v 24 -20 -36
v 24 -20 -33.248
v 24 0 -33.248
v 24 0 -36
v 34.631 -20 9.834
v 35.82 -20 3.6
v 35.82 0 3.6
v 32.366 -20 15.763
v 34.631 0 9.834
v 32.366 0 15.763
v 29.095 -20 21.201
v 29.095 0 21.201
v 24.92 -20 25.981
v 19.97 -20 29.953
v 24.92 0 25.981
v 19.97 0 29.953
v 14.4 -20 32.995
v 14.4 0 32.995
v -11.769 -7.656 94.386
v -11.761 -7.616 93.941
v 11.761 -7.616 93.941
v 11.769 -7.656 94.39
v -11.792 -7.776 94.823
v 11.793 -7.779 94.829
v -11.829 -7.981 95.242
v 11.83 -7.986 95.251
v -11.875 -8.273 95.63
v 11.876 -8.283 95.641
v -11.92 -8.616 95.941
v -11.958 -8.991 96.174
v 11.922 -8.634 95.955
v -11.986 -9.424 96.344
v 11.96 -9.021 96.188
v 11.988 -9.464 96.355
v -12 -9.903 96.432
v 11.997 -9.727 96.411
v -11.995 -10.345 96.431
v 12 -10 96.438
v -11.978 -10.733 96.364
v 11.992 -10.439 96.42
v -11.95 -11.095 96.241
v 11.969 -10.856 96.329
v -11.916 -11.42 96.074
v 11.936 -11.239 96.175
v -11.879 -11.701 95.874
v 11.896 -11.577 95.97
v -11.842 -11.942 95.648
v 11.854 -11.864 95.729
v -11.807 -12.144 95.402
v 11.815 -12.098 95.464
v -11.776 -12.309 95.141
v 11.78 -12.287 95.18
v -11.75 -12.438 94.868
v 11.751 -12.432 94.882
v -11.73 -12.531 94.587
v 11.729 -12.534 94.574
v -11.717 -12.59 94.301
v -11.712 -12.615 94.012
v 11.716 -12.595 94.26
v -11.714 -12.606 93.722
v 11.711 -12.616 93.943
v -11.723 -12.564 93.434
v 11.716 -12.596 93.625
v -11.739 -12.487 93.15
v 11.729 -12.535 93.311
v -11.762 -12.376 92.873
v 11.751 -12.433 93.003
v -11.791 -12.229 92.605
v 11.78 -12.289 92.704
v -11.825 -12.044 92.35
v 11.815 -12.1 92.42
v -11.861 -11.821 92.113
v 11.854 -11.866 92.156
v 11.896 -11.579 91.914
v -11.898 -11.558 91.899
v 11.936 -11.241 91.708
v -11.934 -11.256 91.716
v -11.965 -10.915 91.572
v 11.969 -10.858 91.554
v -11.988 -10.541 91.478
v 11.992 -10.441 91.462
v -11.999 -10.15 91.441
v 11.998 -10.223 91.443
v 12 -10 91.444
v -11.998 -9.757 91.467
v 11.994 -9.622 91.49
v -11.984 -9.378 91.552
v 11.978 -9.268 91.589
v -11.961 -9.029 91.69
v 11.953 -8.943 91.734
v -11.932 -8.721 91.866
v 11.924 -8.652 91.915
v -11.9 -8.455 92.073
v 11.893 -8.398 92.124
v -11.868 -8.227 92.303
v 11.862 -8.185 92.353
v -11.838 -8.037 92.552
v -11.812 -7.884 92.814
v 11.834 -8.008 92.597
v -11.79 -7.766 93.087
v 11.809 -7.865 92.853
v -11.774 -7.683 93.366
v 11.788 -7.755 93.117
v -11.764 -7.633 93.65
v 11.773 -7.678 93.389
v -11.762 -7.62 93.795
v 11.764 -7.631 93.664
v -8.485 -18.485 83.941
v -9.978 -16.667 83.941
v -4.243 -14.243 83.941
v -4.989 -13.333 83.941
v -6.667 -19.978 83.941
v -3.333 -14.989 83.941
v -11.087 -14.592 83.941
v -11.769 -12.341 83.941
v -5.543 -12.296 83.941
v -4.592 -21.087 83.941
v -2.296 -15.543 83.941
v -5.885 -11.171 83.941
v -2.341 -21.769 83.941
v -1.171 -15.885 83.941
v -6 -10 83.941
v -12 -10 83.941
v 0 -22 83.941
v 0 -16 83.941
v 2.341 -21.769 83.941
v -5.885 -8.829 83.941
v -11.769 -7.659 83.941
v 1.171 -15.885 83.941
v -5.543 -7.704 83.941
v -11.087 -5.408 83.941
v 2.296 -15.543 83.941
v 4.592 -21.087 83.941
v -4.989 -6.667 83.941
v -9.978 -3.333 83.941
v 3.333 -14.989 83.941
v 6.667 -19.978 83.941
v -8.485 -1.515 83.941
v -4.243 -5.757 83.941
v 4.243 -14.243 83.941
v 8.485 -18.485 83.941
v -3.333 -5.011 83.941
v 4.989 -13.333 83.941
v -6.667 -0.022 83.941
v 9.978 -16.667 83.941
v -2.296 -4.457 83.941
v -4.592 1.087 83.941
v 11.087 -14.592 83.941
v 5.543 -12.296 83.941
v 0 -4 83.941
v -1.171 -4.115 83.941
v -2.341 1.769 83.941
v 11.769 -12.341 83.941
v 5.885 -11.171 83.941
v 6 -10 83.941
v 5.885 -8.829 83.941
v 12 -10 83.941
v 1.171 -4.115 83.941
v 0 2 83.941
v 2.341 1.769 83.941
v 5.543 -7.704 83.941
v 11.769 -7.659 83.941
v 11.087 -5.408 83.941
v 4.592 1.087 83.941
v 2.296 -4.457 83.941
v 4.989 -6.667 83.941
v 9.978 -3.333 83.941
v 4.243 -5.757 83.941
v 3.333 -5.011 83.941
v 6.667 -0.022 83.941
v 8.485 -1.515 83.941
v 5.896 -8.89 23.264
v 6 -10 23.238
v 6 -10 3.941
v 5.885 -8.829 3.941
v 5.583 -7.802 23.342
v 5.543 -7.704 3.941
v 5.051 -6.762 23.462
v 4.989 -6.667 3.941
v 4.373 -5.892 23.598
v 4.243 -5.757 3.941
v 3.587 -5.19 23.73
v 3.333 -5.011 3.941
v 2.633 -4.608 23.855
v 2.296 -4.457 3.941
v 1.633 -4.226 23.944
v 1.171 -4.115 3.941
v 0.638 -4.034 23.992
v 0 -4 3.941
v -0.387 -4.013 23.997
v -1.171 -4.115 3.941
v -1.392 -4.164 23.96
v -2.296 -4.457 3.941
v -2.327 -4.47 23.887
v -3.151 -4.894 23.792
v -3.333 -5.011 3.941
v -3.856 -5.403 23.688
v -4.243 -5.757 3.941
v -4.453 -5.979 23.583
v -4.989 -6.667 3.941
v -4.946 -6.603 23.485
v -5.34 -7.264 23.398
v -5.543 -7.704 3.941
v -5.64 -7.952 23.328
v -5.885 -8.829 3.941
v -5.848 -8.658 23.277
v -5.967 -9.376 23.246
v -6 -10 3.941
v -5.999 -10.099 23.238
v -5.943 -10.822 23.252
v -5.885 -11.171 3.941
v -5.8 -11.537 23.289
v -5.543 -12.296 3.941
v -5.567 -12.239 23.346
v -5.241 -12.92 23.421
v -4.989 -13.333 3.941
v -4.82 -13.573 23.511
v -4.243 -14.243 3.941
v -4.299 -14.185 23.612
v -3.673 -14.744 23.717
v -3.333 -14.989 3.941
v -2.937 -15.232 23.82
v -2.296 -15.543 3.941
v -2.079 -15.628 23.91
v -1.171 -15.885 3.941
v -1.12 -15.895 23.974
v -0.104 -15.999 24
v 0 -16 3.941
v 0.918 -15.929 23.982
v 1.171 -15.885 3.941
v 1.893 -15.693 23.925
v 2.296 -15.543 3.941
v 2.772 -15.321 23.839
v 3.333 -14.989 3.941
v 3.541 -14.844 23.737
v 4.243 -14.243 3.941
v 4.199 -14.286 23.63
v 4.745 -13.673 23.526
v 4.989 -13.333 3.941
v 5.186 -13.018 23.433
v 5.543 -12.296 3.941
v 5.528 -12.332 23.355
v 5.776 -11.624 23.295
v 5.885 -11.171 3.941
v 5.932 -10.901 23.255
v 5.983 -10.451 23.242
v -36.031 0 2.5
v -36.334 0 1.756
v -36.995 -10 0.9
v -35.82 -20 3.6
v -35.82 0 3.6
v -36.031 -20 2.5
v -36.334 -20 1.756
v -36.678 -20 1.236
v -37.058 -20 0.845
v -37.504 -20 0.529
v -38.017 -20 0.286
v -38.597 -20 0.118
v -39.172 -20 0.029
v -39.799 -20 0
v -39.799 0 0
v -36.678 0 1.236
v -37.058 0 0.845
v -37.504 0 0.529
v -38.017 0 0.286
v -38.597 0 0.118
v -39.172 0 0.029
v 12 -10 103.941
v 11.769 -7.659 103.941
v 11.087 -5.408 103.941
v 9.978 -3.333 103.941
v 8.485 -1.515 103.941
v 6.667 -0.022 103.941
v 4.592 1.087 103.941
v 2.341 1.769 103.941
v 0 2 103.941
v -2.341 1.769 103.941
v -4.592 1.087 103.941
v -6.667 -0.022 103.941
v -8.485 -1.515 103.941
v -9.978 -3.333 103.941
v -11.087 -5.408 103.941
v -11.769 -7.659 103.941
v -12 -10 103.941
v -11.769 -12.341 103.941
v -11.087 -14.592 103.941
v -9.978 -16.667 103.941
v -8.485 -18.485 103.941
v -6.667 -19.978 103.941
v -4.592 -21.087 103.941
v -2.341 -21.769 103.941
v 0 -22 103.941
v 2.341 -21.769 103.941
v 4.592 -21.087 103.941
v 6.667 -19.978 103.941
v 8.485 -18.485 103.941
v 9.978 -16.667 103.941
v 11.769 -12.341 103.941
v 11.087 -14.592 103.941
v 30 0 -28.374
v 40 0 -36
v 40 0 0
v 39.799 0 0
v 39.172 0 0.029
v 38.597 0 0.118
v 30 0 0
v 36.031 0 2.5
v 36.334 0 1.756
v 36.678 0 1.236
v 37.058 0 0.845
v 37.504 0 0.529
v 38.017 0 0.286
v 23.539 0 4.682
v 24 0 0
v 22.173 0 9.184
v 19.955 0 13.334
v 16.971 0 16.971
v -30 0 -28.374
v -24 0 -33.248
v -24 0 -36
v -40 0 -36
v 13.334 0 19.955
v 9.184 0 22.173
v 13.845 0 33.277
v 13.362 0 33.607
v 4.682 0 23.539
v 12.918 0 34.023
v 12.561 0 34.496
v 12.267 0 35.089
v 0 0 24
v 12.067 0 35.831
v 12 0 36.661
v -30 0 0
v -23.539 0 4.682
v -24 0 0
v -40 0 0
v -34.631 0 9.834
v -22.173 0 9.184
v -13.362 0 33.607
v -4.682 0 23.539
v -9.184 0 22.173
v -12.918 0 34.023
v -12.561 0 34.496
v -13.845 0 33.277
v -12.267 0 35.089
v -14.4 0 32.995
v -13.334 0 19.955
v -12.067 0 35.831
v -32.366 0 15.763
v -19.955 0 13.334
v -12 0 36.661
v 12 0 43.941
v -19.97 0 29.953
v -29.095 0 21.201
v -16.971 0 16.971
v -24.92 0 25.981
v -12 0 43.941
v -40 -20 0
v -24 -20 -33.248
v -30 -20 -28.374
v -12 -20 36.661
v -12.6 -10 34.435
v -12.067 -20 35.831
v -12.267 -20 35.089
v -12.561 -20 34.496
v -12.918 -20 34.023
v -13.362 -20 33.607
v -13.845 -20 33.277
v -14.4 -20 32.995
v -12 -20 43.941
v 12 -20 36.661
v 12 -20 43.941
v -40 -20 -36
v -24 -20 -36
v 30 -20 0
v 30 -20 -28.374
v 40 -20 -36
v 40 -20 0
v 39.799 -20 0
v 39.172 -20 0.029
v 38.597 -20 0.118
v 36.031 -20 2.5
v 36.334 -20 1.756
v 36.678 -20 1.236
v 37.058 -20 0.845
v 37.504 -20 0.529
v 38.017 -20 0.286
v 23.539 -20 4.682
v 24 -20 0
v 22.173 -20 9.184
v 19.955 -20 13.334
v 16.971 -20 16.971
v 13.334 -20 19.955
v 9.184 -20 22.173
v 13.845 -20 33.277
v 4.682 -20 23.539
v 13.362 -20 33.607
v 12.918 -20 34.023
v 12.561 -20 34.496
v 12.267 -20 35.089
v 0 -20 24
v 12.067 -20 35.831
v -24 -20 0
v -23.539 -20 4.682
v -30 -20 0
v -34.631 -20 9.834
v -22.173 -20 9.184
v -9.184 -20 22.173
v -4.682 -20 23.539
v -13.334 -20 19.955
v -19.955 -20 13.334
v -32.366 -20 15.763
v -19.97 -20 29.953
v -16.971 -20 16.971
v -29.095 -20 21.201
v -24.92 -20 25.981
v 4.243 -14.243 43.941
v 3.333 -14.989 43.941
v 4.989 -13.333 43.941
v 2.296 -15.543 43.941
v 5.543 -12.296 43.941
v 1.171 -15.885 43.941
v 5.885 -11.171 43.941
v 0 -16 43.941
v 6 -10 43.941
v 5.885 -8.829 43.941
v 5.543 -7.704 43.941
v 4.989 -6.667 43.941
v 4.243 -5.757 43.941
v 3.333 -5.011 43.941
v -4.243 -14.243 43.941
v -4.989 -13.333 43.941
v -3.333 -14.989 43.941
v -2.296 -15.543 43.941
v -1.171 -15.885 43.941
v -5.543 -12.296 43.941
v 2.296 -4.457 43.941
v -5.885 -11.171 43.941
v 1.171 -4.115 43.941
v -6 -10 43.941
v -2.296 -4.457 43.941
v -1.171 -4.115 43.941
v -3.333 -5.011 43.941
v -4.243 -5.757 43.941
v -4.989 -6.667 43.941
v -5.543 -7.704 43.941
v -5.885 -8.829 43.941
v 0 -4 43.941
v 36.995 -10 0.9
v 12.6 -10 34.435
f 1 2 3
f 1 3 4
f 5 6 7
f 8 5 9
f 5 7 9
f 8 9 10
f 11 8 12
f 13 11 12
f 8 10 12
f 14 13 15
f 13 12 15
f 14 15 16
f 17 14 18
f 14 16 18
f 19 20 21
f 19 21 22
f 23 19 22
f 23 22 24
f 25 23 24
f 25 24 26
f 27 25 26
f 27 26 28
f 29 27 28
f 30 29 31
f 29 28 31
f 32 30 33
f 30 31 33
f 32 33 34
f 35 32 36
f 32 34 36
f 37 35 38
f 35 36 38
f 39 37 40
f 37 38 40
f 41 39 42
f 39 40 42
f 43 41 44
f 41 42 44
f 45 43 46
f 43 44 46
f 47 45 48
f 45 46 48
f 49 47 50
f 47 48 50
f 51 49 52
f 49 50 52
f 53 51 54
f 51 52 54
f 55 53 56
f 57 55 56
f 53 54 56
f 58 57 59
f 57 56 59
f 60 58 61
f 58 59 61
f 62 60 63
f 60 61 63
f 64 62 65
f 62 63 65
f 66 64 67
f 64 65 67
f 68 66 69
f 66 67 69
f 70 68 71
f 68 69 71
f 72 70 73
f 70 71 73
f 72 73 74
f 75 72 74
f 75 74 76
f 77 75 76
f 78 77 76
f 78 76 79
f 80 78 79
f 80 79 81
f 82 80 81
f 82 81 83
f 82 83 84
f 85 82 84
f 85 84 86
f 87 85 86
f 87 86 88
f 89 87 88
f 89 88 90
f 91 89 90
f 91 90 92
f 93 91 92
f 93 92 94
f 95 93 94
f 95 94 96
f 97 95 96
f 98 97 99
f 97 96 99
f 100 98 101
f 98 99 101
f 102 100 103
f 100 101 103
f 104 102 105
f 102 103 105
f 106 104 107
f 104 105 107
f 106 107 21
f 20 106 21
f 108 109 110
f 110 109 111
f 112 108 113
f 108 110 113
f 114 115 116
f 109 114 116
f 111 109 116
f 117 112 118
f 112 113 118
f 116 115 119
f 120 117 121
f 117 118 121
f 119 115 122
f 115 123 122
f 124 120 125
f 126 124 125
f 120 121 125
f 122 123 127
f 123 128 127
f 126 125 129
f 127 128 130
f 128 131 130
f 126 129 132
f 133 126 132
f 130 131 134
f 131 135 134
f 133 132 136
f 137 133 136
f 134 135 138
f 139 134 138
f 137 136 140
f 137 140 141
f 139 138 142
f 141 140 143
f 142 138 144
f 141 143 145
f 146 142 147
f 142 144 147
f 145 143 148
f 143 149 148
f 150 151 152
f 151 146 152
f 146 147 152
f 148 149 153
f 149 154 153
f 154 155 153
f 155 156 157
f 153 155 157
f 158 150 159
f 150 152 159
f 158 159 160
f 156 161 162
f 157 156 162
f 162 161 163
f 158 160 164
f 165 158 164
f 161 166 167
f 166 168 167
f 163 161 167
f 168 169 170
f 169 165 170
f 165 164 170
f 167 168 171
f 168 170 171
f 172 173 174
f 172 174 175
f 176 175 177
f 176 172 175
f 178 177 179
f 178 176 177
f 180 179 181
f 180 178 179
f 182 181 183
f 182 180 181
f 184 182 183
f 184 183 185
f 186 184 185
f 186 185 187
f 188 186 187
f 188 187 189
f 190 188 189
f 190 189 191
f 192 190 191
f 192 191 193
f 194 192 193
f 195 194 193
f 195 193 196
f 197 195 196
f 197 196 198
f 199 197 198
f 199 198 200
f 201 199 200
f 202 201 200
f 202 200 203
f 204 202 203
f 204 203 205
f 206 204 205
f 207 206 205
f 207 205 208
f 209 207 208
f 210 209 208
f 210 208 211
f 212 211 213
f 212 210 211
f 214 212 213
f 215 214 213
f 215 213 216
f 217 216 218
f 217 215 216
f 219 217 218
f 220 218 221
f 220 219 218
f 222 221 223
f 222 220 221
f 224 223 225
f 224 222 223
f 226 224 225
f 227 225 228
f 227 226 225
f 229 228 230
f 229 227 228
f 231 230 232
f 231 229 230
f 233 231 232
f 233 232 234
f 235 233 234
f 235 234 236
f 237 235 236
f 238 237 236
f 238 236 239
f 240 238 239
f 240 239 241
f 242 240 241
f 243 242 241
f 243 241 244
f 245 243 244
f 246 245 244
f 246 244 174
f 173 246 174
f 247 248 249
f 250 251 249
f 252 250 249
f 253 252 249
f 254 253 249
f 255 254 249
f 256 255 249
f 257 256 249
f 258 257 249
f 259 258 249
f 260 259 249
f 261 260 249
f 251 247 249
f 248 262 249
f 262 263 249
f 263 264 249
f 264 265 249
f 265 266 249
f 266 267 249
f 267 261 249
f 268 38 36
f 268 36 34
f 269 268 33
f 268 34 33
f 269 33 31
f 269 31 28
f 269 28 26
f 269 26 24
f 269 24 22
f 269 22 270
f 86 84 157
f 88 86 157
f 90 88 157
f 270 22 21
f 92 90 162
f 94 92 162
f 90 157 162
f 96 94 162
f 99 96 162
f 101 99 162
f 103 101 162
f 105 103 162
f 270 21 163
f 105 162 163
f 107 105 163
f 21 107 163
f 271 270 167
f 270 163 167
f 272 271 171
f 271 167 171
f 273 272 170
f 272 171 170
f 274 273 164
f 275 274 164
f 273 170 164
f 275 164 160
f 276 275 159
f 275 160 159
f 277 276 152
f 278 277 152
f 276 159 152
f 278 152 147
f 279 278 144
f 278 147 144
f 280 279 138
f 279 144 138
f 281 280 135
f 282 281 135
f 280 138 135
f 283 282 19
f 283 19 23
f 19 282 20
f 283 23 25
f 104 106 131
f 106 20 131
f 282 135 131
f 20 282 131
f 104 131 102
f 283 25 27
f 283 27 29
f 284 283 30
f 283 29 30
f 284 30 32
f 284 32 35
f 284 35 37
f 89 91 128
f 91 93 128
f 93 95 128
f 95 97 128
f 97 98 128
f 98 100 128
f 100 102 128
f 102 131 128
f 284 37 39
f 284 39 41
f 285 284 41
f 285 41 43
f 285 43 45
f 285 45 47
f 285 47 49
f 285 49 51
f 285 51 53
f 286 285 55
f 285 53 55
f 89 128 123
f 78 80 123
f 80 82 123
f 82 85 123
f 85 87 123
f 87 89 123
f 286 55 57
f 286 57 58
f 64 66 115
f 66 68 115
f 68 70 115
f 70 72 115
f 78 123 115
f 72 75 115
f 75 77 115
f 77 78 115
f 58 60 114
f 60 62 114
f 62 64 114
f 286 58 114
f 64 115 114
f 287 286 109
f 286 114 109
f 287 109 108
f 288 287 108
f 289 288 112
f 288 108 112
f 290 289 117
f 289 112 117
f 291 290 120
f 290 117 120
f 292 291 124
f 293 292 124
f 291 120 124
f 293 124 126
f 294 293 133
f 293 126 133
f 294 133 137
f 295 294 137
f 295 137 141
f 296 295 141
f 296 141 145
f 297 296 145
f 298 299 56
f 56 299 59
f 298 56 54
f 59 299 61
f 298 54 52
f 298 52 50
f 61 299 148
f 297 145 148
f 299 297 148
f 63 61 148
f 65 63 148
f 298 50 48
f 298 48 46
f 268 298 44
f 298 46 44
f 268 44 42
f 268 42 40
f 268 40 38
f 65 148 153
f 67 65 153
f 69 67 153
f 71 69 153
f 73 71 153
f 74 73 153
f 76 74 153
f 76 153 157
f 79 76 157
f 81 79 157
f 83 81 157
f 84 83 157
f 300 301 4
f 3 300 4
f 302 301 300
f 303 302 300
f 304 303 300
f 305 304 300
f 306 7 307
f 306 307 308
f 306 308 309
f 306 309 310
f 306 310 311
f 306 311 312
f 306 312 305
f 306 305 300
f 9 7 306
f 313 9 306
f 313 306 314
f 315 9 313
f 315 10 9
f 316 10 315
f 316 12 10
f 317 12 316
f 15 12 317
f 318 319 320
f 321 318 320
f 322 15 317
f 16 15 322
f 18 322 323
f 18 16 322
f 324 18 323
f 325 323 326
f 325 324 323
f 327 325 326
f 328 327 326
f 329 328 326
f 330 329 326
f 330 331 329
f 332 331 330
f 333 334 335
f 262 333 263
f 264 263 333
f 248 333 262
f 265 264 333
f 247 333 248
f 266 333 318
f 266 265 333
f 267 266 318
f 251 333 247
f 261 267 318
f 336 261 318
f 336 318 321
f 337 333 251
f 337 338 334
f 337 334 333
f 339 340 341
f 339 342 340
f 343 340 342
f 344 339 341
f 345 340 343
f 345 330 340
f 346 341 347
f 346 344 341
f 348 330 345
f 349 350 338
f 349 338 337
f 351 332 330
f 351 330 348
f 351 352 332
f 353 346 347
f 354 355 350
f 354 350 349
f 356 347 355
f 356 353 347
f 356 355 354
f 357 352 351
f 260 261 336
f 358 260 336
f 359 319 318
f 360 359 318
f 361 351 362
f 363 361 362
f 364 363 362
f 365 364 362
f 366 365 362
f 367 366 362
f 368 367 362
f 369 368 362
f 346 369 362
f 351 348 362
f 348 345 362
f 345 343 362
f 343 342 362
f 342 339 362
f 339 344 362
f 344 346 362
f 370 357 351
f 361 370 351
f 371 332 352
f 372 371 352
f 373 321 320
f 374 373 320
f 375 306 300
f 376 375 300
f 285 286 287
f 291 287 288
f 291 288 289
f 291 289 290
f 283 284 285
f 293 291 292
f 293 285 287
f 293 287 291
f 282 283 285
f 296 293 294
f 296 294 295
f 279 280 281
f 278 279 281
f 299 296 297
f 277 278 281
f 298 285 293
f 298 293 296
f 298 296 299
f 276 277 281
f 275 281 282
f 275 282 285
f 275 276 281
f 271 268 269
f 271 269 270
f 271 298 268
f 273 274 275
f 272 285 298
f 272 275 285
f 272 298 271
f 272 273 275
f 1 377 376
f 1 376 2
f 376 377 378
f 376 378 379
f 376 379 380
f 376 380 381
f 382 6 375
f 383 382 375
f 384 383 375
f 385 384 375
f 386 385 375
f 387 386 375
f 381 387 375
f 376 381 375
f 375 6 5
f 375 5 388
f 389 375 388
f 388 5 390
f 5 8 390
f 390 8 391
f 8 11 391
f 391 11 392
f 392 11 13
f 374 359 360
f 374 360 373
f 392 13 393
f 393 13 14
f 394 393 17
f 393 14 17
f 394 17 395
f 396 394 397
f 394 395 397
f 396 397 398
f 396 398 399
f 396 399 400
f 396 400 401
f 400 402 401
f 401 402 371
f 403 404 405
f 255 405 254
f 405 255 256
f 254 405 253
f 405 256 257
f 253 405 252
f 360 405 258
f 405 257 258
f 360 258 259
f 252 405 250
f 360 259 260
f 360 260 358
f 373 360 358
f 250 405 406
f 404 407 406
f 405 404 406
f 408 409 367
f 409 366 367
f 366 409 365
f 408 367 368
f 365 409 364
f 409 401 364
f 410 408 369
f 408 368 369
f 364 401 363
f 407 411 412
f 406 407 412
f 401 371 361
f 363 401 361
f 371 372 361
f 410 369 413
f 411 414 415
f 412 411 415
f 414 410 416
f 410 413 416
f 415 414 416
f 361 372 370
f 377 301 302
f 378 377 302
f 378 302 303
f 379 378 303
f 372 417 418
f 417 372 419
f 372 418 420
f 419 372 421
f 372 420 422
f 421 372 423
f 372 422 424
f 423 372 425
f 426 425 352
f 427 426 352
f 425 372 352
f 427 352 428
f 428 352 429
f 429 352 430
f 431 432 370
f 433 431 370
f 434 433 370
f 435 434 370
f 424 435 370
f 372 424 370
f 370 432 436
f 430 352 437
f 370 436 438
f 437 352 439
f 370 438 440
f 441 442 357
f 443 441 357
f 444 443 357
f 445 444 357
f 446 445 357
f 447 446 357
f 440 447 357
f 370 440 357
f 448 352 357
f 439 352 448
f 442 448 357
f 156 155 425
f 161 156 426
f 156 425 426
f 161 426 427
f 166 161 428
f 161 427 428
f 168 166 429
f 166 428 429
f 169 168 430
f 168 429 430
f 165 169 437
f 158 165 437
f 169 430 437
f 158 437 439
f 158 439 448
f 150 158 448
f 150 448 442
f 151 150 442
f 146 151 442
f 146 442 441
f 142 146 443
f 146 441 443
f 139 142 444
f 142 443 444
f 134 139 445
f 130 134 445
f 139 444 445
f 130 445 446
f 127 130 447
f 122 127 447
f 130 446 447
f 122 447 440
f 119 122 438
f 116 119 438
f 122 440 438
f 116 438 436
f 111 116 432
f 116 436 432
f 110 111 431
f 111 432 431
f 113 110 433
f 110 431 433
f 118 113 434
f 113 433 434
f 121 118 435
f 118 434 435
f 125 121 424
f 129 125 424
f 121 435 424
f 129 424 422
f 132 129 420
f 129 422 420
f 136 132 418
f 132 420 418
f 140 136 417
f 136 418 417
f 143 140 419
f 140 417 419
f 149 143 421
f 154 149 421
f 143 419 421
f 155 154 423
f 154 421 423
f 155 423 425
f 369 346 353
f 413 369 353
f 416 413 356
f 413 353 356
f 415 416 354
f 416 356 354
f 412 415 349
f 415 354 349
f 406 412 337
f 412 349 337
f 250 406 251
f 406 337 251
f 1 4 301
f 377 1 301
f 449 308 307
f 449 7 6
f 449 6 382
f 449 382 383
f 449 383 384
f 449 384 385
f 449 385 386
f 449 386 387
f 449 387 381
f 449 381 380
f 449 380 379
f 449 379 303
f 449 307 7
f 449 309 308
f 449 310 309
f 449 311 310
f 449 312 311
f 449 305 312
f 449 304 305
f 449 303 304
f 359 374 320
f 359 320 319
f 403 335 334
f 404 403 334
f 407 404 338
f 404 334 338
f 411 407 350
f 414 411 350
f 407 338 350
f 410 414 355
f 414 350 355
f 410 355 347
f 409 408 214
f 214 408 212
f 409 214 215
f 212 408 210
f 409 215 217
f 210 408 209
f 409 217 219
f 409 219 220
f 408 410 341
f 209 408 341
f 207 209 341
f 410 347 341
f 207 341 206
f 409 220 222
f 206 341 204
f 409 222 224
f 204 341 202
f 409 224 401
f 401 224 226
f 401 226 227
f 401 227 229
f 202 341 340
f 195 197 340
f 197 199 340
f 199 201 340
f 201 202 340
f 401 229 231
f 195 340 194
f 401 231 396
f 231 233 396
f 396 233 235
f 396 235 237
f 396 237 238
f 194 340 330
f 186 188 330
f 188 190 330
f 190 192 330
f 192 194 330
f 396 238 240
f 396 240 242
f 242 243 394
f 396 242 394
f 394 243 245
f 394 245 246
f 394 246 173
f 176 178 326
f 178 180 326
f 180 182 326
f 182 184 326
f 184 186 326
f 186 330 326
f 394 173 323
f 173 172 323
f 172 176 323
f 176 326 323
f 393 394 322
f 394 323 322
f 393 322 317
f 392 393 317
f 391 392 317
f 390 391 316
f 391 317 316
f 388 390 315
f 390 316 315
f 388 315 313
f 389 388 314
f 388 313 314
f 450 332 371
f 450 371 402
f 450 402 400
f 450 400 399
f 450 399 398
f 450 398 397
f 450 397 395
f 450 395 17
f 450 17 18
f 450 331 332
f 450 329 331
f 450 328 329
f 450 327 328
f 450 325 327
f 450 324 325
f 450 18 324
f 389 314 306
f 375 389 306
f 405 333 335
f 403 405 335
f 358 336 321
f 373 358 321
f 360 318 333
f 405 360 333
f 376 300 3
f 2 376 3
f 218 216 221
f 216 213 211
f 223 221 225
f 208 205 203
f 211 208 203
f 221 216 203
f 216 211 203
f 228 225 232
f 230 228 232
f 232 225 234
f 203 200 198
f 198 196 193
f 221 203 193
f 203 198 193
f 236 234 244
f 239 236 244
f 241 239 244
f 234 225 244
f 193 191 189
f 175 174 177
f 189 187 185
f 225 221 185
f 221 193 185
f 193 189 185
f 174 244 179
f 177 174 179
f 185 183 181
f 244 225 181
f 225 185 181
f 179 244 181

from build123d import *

# Parameters (mm, degrees)
F1_DEPTH      = 20
F2_R          = 6
F3_DEPTH      = 40
F3_DEPTH_BACK = 40
F4_R          = 12
F5_DEPTH      = 20
F7_R          = 2.5
F8_DEPTH      = 25
F9_T1_DEPTH   = 20


# Not quite as in the source:
# - a fillet or chamfer that OpenCascade refuses, or shapes differently, is made with other operations: its cross-section is extruded or revolved along the edge and cut away or added
# - a feature names something its author has since deleted; it is built from what else it names


with BuildPart() as f1:
    # F0 (on Front) → F1 (new body)
    with BuildSketch(Plane.XZ):
        with BuildLine():
            ThreePointArc((-12, 33.941125497), (-29.3938769134, 20.7846096908), (-36, 0))
            Line((-36, 0), (-30, 0))
            Line((-30, 0), (-24, 0))
            ThreePointArc((-24, 0), (0, 24), (24, 0))
            Line((24, 0), (30, 0))
            Line((30, 0), (36, 0))
            ThreePointArc((36, 0), (29.3938769134, 20.7846096908), (12, 33.941125497))
            Line((12, 33.941125497), (12, 43.941125497))
            Line((12, 43.941125497), (-12, 43.941125497))
            Line((-12, 43.941125497), (-12, 33.941125497))
        make_face()
        Polygon((-30, 0), (-36, 0), (-40, 0), (-40, -28.374), (-40, -36), (-24, -36), (-24, -33.2482792437), (-30, -28.374), align=None)
        Polygon((36, 0), (30, 0), (30, -28.374), (24, -33.2482792437), (24, -36), (40, -36), (40, -28.374), (40, 0), align=None)
    extrude(amount=F1_DEPTH)

    # F2 (on face) → F3 (join, two sides)
    with BuildSketch(Plane.XY.offset(43.941125497)) as f3_sk:
        with Locations((0, -10)):
            Circle(F2_R)
    extrude(amount=F3_DEPTH)
    extrude(f3_sk.sketch, amount=-F3_DEPTH_BACK)

    # F4 (on face) → F5 (join)
    with BuildSketch(Plane.XY.offset(83.941125497)):
        with Locations((0, -10)):
            Circle(F4_R)
    extrude(amount=F5_DEPTH)

    # F7 (on offset) → F8 (cut)
    with BuildSketch(Plane.YZ.offset(12)):
        with Locations((-10.1158004254, 93.941125497)):
            Circle(F7_R)
    extrude(amount=-F8_DEPTH, mode=Mode.SUBTRACT)

    # F9: fillet of radius 4 on 4 edges, made by hand

    # F9_s2 → F9_t1 (join)
    with BuildSketch(Plane.XZ):
        with BuildLine():
            add(Edge.make_bspline(
                [(35.8195477358, 3.6), (36.1813613493, 0), (39.7994974843, 0)],
                knots=[0, 0, 0, 1, 1, 1], degree=2, weights=[1, 1, 1]))
            Line((39.7994974843, 0), (36, 0))
            ThreePointArc((36, 0), (35.954858632, 1.8022599022), (35.8195477358, 3.6))
        make_face()
        with BuildLine():
            add(Edge.make_bspline(
                [(-35.8195477358, 3.6), (-36.1813613493, 0), (-39.7994974843, 0)],
                knots=[0, 0, 0, 1, 1, 1], degree=2, weights=[1, 1, 1]))
            Line((-39.7994974843, 0), (-36, 0))
            ThreePointArc((-36, 0), (-35.954858632, 1.8022599022), (-35.8195477358, 3.6))
        make_face()
        with BuildLine():
            add(Edge.make_bspline(
                [(-12, 36.6606055596), (-12, 34.0419908768), (-14.4, 32.9945450037)],
                knots=[0, 0, 0, 1, 1, 1], degree=2, weights=[1, 1, 1]))
            ThreePointArc((-14.4, 32.9945450037), (-13.2084822617, 33.4893415334), (-12, 33.941125497))
            Line((-12, 33.941125497), (-12, 36.6606055596))
        make_face()
        with BuildLine():
            add(Edge.make_bspline(
                [(12, 36.6606055596), (12, 34.0419908768), (14.4, 32.9945450037)],
                knots=[0, 0, 0, 1, 1, 1], degree=2, weights=[1, 1, 1]))
            ThreePointArc((14.4, 32.9945450037), (13.2084822617, 33.4893415334), (12, 33.941125497))
            Line((12, 33.941125497), (12, 36.6606055596))
        make_face()
    extrude(amount=F9_T1_DEPTH)


solid = f1.part
